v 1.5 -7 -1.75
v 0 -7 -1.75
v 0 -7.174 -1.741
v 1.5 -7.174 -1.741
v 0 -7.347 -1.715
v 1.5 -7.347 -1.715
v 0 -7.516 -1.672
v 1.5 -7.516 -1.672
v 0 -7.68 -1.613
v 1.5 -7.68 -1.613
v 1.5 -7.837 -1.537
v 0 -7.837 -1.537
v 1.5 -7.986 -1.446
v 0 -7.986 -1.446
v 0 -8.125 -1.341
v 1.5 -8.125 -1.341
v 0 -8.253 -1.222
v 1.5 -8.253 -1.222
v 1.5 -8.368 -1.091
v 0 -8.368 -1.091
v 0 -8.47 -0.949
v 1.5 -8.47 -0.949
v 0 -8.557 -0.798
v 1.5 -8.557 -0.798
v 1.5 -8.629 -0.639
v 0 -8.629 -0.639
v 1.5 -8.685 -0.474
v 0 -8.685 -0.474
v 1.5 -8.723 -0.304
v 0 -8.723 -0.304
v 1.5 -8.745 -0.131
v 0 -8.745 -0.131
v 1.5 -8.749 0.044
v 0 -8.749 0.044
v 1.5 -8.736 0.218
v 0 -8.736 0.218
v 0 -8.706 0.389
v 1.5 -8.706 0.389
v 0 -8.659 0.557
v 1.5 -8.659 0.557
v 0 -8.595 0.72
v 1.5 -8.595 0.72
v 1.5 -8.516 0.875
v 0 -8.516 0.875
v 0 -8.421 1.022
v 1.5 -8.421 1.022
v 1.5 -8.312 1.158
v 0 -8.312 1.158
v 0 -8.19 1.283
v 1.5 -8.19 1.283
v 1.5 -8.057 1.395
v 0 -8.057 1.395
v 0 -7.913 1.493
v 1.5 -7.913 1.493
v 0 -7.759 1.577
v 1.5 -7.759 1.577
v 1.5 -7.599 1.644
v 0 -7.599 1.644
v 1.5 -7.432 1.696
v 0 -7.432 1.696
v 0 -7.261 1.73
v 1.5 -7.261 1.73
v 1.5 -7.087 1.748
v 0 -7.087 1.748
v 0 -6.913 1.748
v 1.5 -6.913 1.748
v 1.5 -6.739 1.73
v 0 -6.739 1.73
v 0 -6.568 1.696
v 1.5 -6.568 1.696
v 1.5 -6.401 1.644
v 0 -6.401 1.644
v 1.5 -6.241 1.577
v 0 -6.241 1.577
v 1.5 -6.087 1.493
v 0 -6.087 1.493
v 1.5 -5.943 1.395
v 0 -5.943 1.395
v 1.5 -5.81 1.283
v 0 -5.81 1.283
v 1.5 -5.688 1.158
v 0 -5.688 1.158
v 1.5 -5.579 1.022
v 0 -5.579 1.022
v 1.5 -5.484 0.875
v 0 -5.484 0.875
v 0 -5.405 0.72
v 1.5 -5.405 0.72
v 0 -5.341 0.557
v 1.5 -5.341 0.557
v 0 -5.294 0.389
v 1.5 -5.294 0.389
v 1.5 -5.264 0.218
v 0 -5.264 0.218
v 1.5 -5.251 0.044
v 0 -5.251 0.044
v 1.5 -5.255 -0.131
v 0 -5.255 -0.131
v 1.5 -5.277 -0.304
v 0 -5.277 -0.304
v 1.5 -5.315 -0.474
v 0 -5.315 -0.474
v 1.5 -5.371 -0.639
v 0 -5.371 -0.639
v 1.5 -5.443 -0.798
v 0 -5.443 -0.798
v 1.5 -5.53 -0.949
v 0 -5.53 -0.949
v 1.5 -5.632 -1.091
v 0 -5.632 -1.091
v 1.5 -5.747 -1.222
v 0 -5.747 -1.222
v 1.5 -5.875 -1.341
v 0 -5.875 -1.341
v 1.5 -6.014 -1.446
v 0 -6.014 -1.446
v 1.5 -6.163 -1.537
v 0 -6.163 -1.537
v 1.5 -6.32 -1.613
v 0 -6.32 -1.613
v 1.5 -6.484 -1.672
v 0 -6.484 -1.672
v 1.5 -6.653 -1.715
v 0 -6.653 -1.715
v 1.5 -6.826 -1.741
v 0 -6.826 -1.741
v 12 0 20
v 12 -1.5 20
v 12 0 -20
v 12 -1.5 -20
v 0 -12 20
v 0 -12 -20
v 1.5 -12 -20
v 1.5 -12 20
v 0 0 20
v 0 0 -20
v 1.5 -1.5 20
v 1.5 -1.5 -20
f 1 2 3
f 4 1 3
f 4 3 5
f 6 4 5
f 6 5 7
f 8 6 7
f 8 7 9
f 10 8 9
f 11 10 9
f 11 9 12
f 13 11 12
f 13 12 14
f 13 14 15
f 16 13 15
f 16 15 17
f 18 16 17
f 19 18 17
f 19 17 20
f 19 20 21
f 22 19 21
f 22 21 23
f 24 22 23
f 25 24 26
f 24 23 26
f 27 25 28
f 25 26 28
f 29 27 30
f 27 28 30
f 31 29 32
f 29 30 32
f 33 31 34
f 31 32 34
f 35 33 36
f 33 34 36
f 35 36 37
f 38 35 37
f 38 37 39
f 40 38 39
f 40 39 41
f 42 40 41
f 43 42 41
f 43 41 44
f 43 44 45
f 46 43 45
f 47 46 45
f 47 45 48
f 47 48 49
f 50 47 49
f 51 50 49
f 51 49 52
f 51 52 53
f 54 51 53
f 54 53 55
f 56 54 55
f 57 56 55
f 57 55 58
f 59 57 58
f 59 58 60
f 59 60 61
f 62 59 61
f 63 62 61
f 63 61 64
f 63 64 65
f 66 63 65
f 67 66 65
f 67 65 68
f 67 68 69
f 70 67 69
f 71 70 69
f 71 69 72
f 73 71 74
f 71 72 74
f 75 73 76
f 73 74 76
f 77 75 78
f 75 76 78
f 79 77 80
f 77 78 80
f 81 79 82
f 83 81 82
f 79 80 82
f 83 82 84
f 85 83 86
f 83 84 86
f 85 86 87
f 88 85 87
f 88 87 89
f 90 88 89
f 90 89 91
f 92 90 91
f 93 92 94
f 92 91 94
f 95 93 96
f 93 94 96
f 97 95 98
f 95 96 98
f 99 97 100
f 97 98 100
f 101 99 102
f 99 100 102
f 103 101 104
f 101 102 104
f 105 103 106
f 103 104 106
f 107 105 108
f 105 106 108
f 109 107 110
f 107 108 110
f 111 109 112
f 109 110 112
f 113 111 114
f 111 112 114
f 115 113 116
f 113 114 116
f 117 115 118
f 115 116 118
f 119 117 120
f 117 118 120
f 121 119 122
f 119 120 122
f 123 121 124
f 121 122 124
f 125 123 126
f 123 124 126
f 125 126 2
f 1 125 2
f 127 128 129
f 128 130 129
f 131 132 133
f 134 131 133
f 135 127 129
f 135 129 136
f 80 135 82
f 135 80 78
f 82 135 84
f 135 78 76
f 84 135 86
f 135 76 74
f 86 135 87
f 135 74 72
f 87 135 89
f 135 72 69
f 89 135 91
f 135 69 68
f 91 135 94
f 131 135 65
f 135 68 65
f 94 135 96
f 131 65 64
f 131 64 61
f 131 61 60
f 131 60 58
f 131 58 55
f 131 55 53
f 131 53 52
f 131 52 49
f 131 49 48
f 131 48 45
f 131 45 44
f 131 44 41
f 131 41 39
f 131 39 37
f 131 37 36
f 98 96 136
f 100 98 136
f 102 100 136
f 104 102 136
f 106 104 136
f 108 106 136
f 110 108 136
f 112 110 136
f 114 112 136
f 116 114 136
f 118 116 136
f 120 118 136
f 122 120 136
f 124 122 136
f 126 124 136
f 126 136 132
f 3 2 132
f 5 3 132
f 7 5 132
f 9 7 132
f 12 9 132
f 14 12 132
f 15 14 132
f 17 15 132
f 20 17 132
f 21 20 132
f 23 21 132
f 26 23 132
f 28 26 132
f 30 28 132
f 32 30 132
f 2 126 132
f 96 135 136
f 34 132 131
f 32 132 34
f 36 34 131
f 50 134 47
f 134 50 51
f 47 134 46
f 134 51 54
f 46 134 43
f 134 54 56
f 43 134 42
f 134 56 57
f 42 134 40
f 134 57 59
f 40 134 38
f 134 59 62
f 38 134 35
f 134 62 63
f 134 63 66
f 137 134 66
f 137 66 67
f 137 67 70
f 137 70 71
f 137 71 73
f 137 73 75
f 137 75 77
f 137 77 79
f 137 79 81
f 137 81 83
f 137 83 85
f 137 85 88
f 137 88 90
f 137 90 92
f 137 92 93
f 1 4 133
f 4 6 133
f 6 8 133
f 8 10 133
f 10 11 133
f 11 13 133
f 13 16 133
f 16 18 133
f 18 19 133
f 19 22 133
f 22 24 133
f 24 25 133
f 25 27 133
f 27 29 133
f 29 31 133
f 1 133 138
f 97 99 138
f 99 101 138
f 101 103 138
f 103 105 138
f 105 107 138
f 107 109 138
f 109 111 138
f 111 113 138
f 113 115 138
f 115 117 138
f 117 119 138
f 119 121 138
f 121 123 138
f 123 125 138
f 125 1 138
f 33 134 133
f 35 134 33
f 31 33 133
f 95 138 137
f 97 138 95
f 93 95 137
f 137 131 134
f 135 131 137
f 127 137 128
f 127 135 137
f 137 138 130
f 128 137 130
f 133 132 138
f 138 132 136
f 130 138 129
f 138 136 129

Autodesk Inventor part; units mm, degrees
ref_plane "YZ Plane" through (0, 0, 0) normal (1, 0, 0) x (0, 1, 0)
ref_plane "XZ Plane" through (0, 0, 0) normal (0, 1, 0) x (-1, 0, 0)
ref_plane "XY Plane" through (0, 0, 0) normal (0, 0, 1) x (1, 0, 0)
sketch "Szkic1" plane through (0, 0, 0) normal (0, 0, 1) x (1, 0, 0)
  line L0 (0, 0) -> (0, -12)
  line L1 (0, -12) -> (1.5, -12)
  line L2 (1.5, -12) -> (1.5, -1.5)
  line L3 (1.5, -1.5) -> (12, -1.5)
  line L4 (12, -1.5) -> (12, 0)
  line L5 (12, 0) -> (0, 0)
  dimension "d0" = 12
  dimension "d1" = 1.5
  dimension "d2" = 10.5
  dimension "d3" = 10.5
extrude "Wyciągnięcie proste1" add sketch "Szkic1" along normal mid plane 40
sketch "Szkic2" plane through (1.5, -12, 20) normal (1, 0, 0) x (0, 0, -1)
  line L0 (40, 0) -> (0, 0) projected
  line L1 (40, 0) -> (0, 0) construction
  line L2 (20, 0) -> (20, 5) construction
  point P0 (20, 12)
  dimension "d6" = 5
hole "Otwór1" at (1.5, -7, 0) direction (-1, 0, 0) diameter 3.5 end through all
properties part number "bepf_platforma_wspornik_poziomy" material "Aluminium 6061"
